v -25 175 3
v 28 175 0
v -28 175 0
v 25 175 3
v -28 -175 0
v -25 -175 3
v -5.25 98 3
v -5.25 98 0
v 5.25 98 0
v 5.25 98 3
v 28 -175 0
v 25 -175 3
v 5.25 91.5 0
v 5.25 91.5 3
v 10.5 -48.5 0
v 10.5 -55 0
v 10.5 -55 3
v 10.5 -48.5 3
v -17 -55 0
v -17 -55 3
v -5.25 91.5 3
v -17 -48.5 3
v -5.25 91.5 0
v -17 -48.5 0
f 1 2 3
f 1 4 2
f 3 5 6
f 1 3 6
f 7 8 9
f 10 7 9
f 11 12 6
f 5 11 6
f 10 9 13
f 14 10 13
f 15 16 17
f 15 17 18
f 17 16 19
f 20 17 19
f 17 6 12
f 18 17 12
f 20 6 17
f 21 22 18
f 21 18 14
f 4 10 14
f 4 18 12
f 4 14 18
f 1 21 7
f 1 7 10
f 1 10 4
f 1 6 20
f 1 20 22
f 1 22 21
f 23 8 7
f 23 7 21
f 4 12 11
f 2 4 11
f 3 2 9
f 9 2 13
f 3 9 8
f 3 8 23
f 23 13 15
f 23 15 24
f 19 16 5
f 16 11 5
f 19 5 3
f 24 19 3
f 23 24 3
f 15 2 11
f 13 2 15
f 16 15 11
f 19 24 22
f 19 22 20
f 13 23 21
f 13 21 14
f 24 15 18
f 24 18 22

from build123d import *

# Parameters (mm, degrees)
SKETCH1_W           = 350
SKETCH1_H           = 50
BOSS_EXTRUDE1_DEPTH = 3
BOSS_EXTRUDE2_DEPTH = 350
SKETCH3_W           = 10.5
SKETCH3_H           = 6.5
CUT_EXTRUDE1_DEPTH  = 10


with BuildPart() as part:
    # Sketch1 → Boss-Extrude1 (new body)
    with BuildSketch(Plane(origin=(0, 0, 0), x_dir=(0, 1, 0), z_dir=(0, 0, 1))):
        Rectangle(SKETCH1_W, SKETCH1_H)
    extrude(amount=BOSS_EXTRUDE1_DEPTH)

    # Sketch2 → Boss-Extrude2 (add, through all)
    with BuildSketch(Plane.XZ.offset(175)):
        Polygon((-25, 3), (-25, 0), (-28, 0), align=None)
        Polygon((25, 3), (28, 0), (25, 0), align=None)
    extrude(amount=-BOSS_EXTRUDE2_DEPTH)

    # Sketch3 → Cut-Extrude1 (cut)
    with BuildSketch(Plane(origin=(0, 0, 0), x_dir=(1, 0, 0), z_dir=(0, 0, -1))):
        Polygon((0, 55), (10.5, 55), (10.5, 48.5), (-17, 48.5), (-17, 55), align=None)
        with Locations((0, -94.75)):
            Rectangle(SKETCH3_W, SKETCH3_H)
    extrude(amount=-CUT_EXTRUDE1_DEPTH, mode=Mode.SUBTRACT)


solid = part.part
